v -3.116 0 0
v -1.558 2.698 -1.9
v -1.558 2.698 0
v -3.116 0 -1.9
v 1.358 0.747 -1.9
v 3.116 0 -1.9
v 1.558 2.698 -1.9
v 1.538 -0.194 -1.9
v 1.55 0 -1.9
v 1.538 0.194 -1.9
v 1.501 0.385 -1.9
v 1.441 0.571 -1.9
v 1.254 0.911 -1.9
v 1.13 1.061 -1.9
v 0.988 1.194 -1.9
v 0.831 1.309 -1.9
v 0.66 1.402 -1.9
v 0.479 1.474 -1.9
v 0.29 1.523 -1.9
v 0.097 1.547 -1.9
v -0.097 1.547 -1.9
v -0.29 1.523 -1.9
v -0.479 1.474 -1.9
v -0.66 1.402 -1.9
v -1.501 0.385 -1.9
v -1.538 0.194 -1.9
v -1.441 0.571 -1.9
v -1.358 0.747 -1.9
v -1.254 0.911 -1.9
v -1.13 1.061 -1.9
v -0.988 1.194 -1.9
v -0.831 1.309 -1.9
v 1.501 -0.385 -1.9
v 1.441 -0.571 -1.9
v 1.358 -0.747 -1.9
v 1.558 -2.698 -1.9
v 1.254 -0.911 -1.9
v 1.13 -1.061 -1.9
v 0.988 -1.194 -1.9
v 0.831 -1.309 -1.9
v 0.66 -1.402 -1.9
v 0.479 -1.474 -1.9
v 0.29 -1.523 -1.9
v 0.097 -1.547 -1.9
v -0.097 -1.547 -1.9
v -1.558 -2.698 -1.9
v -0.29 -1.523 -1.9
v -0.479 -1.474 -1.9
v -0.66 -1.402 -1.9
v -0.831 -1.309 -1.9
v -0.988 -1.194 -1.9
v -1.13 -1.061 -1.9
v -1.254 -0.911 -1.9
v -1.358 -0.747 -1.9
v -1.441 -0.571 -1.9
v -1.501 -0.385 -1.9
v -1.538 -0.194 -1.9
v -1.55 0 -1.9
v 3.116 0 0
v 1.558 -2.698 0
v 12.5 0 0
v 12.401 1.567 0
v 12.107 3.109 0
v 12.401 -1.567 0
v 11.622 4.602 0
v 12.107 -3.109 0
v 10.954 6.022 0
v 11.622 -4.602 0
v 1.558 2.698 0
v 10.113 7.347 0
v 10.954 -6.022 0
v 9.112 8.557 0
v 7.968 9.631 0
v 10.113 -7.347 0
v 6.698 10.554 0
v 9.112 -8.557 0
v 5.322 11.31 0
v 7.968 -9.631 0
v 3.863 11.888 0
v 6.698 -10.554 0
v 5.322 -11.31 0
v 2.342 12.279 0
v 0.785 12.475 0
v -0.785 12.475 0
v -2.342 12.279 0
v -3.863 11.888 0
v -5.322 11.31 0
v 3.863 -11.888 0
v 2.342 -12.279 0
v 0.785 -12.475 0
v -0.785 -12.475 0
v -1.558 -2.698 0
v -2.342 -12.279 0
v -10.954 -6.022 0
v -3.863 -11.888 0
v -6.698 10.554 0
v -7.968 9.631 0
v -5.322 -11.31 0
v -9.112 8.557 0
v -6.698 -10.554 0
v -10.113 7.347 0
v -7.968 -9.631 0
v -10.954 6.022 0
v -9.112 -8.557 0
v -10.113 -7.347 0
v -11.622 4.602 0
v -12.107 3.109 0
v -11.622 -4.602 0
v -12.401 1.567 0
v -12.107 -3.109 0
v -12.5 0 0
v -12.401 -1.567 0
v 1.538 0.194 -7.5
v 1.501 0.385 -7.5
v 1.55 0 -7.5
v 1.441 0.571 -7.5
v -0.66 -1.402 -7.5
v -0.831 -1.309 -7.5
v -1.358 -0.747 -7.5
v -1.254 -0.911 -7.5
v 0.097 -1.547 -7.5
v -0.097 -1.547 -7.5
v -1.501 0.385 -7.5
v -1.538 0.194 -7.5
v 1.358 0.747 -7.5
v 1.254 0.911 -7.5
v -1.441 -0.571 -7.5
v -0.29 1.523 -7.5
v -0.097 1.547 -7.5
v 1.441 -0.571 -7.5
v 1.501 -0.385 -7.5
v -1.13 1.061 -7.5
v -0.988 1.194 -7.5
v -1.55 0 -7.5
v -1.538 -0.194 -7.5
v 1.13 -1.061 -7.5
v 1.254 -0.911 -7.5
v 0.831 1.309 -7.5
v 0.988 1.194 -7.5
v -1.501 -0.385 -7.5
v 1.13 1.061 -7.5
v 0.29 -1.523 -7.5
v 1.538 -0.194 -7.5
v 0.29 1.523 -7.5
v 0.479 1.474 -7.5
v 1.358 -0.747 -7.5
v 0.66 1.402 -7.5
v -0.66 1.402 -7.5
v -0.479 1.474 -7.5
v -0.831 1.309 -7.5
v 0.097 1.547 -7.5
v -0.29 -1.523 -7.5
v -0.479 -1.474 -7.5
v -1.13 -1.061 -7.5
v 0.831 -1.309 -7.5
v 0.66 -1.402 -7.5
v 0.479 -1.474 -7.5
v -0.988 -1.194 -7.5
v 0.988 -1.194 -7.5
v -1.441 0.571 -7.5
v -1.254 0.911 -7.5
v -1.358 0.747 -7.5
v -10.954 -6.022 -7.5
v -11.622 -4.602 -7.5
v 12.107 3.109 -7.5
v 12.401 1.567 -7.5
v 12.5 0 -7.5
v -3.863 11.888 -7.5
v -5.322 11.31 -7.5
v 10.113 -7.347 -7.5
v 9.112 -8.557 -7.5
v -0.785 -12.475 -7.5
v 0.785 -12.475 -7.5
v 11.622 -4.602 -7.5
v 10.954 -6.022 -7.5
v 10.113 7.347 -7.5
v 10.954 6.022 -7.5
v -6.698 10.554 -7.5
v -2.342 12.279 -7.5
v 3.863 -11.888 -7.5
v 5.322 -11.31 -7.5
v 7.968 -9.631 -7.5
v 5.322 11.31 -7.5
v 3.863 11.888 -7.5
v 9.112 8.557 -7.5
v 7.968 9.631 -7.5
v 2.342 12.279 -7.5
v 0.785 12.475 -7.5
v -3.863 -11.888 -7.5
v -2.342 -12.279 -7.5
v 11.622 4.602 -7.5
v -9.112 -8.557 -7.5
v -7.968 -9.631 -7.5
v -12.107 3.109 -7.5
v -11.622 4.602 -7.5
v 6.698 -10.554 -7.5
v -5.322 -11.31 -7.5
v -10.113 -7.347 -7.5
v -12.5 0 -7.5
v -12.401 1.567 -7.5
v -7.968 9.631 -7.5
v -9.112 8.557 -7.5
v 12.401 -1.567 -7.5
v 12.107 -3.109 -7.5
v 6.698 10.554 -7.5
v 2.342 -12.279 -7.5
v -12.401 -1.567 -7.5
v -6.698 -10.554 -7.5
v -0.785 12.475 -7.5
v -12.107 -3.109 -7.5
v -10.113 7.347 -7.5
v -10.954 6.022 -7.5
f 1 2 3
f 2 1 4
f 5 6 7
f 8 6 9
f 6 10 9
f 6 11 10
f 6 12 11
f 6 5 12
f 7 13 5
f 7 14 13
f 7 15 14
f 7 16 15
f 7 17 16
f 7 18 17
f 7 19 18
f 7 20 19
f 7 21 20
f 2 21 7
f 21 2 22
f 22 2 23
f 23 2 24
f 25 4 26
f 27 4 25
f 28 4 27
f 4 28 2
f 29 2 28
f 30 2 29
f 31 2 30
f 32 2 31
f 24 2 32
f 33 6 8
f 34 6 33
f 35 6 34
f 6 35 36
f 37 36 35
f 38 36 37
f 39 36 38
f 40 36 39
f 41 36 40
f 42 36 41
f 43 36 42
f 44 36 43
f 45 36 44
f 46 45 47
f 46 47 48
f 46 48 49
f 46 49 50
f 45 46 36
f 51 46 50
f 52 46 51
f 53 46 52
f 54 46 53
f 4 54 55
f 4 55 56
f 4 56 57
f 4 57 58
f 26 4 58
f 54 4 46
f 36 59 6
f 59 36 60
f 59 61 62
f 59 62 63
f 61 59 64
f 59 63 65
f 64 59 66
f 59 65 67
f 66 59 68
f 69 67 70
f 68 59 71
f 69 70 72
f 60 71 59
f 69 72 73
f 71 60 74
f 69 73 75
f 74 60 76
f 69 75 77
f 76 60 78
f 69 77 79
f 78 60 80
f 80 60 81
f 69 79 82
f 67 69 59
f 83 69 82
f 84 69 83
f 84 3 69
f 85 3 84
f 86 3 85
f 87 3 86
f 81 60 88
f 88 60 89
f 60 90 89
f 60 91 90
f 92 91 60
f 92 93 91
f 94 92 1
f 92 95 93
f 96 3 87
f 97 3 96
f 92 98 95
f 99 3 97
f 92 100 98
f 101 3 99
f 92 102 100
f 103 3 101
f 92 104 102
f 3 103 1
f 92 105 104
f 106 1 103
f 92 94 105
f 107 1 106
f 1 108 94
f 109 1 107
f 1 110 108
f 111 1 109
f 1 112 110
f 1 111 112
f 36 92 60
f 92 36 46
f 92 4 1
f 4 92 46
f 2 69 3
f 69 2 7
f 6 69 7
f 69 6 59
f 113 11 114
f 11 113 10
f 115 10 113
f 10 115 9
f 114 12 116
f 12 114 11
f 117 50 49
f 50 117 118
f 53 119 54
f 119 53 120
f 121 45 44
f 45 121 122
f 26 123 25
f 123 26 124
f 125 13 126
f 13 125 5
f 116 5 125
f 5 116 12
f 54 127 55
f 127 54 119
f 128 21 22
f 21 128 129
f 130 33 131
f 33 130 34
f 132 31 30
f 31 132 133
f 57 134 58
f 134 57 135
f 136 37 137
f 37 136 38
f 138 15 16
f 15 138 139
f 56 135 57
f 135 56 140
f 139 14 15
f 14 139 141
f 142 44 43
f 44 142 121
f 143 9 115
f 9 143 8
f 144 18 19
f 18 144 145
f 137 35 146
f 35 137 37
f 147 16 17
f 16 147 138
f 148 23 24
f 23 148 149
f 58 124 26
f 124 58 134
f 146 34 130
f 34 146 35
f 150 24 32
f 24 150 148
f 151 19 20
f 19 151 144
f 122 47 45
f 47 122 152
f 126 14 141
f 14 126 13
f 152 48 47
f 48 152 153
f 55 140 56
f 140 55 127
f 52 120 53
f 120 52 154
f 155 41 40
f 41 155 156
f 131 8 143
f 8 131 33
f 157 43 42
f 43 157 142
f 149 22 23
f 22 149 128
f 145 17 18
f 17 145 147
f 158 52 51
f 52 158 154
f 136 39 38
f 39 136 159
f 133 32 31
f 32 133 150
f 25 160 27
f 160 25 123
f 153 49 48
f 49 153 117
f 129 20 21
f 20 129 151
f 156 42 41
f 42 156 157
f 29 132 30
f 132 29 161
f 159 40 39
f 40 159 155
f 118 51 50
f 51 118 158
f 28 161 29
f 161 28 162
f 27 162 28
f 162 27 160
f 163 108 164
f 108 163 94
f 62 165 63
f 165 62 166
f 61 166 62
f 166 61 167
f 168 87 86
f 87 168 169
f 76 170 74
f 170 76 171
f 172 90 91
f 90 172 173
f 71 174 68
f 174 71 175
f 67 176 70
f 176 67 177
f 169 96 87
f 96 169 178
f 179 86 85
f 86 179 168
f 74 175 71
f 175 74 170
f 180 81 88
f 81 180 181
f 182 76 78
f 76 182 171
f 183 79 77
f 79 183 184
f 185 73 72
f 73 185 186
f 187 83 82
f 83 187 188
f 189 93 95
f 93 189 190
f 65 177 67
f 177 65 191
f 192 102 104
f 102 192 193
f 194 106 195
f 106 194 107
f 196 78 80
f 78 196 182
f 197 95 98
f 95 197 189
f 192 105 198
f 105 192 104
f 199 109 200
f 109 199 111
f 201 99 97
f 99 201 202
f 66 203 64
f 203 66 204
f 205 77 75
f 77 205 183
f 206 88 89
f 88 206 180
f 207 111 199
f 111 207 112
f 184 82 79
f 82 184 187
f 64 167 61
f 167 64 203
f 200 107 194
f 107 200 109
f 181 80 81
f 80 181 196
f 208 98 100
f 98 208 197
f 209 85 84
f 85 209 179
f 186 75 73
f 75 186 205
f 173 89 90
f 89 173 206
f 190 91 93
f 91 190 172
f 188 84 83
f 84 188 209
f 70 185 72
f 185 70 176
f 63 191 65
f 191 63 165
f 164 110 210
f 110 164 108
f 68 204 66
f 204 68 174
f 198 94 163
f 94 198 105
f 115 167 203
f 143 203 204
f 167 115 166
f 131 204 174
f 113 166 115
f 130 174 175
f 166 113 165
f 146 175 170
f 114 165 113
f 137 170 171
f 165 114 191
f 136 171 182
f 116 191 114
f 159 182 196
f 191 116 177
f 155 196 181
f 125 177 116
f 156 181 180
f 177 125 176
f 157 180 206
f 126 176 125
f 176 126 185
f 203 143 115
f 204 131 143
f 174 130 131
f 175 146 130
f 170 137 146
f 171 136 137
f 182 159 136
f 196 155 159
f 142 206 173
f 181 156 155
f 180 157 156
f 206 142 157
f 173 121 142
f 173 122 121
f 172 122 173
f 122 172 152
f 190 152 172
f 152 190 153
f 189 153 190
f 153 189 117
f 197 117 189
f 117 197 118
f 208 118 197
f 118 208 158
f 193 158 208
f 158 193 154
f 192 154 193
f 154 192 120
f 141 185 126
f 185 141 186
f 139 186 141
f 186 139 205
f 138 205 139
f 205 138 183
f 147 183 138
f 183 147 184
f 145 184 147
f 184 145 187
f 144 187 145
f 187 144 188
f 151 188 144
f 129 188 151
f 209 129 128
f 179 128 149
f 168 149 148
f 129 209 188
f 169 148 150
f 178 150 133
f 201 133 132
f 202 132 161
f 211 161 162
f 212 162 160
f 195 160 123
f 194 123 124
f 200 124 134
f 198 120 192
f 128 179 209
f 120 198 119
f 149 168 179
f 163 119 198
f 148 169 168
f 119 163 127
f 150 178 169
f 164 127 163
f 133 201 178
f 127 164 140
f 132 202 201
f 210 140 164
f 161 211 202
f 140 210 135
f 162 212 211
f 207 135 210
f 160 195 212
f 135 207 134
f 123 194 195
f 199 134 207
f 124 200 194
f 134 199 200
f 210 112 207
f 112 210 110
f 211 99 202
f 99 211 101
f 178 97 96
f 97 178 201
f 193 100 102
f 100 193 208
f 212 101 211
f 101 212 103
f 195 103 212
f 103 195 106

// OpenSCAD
$fn = 50;

difference() {
	union() {
		translate(v = [0, 0, -7.5]) {
			cylinder(h = 7.5, r = 12.5);
		}
	}
	union() {
		translate(v = [0, 0, 0]) {
			rotate(a = [0, 0, 0]) {
				difference() {
					union() {
						translate(v = [0, 0, -1.9]) {
							linear_extrude(height = 1.9) {
								polygon(points = [[3.1158, 0.0], [1.5579000000000005, 2.698361953111554], [-1.5578999999999994, 2.6983619531115544], [-3.1158, 3.815754496783323e-16], [-1.5579000000000014, -2.6983619531115535], [1.557899999999998, -2.6983619531115552]]);
							}
						}
					}
					union();
				}
			}
		}
		#translate(v = [0, 0, -100.0]) {
			cylinder(h = 200, r = 1.55);
		}
	}
}
